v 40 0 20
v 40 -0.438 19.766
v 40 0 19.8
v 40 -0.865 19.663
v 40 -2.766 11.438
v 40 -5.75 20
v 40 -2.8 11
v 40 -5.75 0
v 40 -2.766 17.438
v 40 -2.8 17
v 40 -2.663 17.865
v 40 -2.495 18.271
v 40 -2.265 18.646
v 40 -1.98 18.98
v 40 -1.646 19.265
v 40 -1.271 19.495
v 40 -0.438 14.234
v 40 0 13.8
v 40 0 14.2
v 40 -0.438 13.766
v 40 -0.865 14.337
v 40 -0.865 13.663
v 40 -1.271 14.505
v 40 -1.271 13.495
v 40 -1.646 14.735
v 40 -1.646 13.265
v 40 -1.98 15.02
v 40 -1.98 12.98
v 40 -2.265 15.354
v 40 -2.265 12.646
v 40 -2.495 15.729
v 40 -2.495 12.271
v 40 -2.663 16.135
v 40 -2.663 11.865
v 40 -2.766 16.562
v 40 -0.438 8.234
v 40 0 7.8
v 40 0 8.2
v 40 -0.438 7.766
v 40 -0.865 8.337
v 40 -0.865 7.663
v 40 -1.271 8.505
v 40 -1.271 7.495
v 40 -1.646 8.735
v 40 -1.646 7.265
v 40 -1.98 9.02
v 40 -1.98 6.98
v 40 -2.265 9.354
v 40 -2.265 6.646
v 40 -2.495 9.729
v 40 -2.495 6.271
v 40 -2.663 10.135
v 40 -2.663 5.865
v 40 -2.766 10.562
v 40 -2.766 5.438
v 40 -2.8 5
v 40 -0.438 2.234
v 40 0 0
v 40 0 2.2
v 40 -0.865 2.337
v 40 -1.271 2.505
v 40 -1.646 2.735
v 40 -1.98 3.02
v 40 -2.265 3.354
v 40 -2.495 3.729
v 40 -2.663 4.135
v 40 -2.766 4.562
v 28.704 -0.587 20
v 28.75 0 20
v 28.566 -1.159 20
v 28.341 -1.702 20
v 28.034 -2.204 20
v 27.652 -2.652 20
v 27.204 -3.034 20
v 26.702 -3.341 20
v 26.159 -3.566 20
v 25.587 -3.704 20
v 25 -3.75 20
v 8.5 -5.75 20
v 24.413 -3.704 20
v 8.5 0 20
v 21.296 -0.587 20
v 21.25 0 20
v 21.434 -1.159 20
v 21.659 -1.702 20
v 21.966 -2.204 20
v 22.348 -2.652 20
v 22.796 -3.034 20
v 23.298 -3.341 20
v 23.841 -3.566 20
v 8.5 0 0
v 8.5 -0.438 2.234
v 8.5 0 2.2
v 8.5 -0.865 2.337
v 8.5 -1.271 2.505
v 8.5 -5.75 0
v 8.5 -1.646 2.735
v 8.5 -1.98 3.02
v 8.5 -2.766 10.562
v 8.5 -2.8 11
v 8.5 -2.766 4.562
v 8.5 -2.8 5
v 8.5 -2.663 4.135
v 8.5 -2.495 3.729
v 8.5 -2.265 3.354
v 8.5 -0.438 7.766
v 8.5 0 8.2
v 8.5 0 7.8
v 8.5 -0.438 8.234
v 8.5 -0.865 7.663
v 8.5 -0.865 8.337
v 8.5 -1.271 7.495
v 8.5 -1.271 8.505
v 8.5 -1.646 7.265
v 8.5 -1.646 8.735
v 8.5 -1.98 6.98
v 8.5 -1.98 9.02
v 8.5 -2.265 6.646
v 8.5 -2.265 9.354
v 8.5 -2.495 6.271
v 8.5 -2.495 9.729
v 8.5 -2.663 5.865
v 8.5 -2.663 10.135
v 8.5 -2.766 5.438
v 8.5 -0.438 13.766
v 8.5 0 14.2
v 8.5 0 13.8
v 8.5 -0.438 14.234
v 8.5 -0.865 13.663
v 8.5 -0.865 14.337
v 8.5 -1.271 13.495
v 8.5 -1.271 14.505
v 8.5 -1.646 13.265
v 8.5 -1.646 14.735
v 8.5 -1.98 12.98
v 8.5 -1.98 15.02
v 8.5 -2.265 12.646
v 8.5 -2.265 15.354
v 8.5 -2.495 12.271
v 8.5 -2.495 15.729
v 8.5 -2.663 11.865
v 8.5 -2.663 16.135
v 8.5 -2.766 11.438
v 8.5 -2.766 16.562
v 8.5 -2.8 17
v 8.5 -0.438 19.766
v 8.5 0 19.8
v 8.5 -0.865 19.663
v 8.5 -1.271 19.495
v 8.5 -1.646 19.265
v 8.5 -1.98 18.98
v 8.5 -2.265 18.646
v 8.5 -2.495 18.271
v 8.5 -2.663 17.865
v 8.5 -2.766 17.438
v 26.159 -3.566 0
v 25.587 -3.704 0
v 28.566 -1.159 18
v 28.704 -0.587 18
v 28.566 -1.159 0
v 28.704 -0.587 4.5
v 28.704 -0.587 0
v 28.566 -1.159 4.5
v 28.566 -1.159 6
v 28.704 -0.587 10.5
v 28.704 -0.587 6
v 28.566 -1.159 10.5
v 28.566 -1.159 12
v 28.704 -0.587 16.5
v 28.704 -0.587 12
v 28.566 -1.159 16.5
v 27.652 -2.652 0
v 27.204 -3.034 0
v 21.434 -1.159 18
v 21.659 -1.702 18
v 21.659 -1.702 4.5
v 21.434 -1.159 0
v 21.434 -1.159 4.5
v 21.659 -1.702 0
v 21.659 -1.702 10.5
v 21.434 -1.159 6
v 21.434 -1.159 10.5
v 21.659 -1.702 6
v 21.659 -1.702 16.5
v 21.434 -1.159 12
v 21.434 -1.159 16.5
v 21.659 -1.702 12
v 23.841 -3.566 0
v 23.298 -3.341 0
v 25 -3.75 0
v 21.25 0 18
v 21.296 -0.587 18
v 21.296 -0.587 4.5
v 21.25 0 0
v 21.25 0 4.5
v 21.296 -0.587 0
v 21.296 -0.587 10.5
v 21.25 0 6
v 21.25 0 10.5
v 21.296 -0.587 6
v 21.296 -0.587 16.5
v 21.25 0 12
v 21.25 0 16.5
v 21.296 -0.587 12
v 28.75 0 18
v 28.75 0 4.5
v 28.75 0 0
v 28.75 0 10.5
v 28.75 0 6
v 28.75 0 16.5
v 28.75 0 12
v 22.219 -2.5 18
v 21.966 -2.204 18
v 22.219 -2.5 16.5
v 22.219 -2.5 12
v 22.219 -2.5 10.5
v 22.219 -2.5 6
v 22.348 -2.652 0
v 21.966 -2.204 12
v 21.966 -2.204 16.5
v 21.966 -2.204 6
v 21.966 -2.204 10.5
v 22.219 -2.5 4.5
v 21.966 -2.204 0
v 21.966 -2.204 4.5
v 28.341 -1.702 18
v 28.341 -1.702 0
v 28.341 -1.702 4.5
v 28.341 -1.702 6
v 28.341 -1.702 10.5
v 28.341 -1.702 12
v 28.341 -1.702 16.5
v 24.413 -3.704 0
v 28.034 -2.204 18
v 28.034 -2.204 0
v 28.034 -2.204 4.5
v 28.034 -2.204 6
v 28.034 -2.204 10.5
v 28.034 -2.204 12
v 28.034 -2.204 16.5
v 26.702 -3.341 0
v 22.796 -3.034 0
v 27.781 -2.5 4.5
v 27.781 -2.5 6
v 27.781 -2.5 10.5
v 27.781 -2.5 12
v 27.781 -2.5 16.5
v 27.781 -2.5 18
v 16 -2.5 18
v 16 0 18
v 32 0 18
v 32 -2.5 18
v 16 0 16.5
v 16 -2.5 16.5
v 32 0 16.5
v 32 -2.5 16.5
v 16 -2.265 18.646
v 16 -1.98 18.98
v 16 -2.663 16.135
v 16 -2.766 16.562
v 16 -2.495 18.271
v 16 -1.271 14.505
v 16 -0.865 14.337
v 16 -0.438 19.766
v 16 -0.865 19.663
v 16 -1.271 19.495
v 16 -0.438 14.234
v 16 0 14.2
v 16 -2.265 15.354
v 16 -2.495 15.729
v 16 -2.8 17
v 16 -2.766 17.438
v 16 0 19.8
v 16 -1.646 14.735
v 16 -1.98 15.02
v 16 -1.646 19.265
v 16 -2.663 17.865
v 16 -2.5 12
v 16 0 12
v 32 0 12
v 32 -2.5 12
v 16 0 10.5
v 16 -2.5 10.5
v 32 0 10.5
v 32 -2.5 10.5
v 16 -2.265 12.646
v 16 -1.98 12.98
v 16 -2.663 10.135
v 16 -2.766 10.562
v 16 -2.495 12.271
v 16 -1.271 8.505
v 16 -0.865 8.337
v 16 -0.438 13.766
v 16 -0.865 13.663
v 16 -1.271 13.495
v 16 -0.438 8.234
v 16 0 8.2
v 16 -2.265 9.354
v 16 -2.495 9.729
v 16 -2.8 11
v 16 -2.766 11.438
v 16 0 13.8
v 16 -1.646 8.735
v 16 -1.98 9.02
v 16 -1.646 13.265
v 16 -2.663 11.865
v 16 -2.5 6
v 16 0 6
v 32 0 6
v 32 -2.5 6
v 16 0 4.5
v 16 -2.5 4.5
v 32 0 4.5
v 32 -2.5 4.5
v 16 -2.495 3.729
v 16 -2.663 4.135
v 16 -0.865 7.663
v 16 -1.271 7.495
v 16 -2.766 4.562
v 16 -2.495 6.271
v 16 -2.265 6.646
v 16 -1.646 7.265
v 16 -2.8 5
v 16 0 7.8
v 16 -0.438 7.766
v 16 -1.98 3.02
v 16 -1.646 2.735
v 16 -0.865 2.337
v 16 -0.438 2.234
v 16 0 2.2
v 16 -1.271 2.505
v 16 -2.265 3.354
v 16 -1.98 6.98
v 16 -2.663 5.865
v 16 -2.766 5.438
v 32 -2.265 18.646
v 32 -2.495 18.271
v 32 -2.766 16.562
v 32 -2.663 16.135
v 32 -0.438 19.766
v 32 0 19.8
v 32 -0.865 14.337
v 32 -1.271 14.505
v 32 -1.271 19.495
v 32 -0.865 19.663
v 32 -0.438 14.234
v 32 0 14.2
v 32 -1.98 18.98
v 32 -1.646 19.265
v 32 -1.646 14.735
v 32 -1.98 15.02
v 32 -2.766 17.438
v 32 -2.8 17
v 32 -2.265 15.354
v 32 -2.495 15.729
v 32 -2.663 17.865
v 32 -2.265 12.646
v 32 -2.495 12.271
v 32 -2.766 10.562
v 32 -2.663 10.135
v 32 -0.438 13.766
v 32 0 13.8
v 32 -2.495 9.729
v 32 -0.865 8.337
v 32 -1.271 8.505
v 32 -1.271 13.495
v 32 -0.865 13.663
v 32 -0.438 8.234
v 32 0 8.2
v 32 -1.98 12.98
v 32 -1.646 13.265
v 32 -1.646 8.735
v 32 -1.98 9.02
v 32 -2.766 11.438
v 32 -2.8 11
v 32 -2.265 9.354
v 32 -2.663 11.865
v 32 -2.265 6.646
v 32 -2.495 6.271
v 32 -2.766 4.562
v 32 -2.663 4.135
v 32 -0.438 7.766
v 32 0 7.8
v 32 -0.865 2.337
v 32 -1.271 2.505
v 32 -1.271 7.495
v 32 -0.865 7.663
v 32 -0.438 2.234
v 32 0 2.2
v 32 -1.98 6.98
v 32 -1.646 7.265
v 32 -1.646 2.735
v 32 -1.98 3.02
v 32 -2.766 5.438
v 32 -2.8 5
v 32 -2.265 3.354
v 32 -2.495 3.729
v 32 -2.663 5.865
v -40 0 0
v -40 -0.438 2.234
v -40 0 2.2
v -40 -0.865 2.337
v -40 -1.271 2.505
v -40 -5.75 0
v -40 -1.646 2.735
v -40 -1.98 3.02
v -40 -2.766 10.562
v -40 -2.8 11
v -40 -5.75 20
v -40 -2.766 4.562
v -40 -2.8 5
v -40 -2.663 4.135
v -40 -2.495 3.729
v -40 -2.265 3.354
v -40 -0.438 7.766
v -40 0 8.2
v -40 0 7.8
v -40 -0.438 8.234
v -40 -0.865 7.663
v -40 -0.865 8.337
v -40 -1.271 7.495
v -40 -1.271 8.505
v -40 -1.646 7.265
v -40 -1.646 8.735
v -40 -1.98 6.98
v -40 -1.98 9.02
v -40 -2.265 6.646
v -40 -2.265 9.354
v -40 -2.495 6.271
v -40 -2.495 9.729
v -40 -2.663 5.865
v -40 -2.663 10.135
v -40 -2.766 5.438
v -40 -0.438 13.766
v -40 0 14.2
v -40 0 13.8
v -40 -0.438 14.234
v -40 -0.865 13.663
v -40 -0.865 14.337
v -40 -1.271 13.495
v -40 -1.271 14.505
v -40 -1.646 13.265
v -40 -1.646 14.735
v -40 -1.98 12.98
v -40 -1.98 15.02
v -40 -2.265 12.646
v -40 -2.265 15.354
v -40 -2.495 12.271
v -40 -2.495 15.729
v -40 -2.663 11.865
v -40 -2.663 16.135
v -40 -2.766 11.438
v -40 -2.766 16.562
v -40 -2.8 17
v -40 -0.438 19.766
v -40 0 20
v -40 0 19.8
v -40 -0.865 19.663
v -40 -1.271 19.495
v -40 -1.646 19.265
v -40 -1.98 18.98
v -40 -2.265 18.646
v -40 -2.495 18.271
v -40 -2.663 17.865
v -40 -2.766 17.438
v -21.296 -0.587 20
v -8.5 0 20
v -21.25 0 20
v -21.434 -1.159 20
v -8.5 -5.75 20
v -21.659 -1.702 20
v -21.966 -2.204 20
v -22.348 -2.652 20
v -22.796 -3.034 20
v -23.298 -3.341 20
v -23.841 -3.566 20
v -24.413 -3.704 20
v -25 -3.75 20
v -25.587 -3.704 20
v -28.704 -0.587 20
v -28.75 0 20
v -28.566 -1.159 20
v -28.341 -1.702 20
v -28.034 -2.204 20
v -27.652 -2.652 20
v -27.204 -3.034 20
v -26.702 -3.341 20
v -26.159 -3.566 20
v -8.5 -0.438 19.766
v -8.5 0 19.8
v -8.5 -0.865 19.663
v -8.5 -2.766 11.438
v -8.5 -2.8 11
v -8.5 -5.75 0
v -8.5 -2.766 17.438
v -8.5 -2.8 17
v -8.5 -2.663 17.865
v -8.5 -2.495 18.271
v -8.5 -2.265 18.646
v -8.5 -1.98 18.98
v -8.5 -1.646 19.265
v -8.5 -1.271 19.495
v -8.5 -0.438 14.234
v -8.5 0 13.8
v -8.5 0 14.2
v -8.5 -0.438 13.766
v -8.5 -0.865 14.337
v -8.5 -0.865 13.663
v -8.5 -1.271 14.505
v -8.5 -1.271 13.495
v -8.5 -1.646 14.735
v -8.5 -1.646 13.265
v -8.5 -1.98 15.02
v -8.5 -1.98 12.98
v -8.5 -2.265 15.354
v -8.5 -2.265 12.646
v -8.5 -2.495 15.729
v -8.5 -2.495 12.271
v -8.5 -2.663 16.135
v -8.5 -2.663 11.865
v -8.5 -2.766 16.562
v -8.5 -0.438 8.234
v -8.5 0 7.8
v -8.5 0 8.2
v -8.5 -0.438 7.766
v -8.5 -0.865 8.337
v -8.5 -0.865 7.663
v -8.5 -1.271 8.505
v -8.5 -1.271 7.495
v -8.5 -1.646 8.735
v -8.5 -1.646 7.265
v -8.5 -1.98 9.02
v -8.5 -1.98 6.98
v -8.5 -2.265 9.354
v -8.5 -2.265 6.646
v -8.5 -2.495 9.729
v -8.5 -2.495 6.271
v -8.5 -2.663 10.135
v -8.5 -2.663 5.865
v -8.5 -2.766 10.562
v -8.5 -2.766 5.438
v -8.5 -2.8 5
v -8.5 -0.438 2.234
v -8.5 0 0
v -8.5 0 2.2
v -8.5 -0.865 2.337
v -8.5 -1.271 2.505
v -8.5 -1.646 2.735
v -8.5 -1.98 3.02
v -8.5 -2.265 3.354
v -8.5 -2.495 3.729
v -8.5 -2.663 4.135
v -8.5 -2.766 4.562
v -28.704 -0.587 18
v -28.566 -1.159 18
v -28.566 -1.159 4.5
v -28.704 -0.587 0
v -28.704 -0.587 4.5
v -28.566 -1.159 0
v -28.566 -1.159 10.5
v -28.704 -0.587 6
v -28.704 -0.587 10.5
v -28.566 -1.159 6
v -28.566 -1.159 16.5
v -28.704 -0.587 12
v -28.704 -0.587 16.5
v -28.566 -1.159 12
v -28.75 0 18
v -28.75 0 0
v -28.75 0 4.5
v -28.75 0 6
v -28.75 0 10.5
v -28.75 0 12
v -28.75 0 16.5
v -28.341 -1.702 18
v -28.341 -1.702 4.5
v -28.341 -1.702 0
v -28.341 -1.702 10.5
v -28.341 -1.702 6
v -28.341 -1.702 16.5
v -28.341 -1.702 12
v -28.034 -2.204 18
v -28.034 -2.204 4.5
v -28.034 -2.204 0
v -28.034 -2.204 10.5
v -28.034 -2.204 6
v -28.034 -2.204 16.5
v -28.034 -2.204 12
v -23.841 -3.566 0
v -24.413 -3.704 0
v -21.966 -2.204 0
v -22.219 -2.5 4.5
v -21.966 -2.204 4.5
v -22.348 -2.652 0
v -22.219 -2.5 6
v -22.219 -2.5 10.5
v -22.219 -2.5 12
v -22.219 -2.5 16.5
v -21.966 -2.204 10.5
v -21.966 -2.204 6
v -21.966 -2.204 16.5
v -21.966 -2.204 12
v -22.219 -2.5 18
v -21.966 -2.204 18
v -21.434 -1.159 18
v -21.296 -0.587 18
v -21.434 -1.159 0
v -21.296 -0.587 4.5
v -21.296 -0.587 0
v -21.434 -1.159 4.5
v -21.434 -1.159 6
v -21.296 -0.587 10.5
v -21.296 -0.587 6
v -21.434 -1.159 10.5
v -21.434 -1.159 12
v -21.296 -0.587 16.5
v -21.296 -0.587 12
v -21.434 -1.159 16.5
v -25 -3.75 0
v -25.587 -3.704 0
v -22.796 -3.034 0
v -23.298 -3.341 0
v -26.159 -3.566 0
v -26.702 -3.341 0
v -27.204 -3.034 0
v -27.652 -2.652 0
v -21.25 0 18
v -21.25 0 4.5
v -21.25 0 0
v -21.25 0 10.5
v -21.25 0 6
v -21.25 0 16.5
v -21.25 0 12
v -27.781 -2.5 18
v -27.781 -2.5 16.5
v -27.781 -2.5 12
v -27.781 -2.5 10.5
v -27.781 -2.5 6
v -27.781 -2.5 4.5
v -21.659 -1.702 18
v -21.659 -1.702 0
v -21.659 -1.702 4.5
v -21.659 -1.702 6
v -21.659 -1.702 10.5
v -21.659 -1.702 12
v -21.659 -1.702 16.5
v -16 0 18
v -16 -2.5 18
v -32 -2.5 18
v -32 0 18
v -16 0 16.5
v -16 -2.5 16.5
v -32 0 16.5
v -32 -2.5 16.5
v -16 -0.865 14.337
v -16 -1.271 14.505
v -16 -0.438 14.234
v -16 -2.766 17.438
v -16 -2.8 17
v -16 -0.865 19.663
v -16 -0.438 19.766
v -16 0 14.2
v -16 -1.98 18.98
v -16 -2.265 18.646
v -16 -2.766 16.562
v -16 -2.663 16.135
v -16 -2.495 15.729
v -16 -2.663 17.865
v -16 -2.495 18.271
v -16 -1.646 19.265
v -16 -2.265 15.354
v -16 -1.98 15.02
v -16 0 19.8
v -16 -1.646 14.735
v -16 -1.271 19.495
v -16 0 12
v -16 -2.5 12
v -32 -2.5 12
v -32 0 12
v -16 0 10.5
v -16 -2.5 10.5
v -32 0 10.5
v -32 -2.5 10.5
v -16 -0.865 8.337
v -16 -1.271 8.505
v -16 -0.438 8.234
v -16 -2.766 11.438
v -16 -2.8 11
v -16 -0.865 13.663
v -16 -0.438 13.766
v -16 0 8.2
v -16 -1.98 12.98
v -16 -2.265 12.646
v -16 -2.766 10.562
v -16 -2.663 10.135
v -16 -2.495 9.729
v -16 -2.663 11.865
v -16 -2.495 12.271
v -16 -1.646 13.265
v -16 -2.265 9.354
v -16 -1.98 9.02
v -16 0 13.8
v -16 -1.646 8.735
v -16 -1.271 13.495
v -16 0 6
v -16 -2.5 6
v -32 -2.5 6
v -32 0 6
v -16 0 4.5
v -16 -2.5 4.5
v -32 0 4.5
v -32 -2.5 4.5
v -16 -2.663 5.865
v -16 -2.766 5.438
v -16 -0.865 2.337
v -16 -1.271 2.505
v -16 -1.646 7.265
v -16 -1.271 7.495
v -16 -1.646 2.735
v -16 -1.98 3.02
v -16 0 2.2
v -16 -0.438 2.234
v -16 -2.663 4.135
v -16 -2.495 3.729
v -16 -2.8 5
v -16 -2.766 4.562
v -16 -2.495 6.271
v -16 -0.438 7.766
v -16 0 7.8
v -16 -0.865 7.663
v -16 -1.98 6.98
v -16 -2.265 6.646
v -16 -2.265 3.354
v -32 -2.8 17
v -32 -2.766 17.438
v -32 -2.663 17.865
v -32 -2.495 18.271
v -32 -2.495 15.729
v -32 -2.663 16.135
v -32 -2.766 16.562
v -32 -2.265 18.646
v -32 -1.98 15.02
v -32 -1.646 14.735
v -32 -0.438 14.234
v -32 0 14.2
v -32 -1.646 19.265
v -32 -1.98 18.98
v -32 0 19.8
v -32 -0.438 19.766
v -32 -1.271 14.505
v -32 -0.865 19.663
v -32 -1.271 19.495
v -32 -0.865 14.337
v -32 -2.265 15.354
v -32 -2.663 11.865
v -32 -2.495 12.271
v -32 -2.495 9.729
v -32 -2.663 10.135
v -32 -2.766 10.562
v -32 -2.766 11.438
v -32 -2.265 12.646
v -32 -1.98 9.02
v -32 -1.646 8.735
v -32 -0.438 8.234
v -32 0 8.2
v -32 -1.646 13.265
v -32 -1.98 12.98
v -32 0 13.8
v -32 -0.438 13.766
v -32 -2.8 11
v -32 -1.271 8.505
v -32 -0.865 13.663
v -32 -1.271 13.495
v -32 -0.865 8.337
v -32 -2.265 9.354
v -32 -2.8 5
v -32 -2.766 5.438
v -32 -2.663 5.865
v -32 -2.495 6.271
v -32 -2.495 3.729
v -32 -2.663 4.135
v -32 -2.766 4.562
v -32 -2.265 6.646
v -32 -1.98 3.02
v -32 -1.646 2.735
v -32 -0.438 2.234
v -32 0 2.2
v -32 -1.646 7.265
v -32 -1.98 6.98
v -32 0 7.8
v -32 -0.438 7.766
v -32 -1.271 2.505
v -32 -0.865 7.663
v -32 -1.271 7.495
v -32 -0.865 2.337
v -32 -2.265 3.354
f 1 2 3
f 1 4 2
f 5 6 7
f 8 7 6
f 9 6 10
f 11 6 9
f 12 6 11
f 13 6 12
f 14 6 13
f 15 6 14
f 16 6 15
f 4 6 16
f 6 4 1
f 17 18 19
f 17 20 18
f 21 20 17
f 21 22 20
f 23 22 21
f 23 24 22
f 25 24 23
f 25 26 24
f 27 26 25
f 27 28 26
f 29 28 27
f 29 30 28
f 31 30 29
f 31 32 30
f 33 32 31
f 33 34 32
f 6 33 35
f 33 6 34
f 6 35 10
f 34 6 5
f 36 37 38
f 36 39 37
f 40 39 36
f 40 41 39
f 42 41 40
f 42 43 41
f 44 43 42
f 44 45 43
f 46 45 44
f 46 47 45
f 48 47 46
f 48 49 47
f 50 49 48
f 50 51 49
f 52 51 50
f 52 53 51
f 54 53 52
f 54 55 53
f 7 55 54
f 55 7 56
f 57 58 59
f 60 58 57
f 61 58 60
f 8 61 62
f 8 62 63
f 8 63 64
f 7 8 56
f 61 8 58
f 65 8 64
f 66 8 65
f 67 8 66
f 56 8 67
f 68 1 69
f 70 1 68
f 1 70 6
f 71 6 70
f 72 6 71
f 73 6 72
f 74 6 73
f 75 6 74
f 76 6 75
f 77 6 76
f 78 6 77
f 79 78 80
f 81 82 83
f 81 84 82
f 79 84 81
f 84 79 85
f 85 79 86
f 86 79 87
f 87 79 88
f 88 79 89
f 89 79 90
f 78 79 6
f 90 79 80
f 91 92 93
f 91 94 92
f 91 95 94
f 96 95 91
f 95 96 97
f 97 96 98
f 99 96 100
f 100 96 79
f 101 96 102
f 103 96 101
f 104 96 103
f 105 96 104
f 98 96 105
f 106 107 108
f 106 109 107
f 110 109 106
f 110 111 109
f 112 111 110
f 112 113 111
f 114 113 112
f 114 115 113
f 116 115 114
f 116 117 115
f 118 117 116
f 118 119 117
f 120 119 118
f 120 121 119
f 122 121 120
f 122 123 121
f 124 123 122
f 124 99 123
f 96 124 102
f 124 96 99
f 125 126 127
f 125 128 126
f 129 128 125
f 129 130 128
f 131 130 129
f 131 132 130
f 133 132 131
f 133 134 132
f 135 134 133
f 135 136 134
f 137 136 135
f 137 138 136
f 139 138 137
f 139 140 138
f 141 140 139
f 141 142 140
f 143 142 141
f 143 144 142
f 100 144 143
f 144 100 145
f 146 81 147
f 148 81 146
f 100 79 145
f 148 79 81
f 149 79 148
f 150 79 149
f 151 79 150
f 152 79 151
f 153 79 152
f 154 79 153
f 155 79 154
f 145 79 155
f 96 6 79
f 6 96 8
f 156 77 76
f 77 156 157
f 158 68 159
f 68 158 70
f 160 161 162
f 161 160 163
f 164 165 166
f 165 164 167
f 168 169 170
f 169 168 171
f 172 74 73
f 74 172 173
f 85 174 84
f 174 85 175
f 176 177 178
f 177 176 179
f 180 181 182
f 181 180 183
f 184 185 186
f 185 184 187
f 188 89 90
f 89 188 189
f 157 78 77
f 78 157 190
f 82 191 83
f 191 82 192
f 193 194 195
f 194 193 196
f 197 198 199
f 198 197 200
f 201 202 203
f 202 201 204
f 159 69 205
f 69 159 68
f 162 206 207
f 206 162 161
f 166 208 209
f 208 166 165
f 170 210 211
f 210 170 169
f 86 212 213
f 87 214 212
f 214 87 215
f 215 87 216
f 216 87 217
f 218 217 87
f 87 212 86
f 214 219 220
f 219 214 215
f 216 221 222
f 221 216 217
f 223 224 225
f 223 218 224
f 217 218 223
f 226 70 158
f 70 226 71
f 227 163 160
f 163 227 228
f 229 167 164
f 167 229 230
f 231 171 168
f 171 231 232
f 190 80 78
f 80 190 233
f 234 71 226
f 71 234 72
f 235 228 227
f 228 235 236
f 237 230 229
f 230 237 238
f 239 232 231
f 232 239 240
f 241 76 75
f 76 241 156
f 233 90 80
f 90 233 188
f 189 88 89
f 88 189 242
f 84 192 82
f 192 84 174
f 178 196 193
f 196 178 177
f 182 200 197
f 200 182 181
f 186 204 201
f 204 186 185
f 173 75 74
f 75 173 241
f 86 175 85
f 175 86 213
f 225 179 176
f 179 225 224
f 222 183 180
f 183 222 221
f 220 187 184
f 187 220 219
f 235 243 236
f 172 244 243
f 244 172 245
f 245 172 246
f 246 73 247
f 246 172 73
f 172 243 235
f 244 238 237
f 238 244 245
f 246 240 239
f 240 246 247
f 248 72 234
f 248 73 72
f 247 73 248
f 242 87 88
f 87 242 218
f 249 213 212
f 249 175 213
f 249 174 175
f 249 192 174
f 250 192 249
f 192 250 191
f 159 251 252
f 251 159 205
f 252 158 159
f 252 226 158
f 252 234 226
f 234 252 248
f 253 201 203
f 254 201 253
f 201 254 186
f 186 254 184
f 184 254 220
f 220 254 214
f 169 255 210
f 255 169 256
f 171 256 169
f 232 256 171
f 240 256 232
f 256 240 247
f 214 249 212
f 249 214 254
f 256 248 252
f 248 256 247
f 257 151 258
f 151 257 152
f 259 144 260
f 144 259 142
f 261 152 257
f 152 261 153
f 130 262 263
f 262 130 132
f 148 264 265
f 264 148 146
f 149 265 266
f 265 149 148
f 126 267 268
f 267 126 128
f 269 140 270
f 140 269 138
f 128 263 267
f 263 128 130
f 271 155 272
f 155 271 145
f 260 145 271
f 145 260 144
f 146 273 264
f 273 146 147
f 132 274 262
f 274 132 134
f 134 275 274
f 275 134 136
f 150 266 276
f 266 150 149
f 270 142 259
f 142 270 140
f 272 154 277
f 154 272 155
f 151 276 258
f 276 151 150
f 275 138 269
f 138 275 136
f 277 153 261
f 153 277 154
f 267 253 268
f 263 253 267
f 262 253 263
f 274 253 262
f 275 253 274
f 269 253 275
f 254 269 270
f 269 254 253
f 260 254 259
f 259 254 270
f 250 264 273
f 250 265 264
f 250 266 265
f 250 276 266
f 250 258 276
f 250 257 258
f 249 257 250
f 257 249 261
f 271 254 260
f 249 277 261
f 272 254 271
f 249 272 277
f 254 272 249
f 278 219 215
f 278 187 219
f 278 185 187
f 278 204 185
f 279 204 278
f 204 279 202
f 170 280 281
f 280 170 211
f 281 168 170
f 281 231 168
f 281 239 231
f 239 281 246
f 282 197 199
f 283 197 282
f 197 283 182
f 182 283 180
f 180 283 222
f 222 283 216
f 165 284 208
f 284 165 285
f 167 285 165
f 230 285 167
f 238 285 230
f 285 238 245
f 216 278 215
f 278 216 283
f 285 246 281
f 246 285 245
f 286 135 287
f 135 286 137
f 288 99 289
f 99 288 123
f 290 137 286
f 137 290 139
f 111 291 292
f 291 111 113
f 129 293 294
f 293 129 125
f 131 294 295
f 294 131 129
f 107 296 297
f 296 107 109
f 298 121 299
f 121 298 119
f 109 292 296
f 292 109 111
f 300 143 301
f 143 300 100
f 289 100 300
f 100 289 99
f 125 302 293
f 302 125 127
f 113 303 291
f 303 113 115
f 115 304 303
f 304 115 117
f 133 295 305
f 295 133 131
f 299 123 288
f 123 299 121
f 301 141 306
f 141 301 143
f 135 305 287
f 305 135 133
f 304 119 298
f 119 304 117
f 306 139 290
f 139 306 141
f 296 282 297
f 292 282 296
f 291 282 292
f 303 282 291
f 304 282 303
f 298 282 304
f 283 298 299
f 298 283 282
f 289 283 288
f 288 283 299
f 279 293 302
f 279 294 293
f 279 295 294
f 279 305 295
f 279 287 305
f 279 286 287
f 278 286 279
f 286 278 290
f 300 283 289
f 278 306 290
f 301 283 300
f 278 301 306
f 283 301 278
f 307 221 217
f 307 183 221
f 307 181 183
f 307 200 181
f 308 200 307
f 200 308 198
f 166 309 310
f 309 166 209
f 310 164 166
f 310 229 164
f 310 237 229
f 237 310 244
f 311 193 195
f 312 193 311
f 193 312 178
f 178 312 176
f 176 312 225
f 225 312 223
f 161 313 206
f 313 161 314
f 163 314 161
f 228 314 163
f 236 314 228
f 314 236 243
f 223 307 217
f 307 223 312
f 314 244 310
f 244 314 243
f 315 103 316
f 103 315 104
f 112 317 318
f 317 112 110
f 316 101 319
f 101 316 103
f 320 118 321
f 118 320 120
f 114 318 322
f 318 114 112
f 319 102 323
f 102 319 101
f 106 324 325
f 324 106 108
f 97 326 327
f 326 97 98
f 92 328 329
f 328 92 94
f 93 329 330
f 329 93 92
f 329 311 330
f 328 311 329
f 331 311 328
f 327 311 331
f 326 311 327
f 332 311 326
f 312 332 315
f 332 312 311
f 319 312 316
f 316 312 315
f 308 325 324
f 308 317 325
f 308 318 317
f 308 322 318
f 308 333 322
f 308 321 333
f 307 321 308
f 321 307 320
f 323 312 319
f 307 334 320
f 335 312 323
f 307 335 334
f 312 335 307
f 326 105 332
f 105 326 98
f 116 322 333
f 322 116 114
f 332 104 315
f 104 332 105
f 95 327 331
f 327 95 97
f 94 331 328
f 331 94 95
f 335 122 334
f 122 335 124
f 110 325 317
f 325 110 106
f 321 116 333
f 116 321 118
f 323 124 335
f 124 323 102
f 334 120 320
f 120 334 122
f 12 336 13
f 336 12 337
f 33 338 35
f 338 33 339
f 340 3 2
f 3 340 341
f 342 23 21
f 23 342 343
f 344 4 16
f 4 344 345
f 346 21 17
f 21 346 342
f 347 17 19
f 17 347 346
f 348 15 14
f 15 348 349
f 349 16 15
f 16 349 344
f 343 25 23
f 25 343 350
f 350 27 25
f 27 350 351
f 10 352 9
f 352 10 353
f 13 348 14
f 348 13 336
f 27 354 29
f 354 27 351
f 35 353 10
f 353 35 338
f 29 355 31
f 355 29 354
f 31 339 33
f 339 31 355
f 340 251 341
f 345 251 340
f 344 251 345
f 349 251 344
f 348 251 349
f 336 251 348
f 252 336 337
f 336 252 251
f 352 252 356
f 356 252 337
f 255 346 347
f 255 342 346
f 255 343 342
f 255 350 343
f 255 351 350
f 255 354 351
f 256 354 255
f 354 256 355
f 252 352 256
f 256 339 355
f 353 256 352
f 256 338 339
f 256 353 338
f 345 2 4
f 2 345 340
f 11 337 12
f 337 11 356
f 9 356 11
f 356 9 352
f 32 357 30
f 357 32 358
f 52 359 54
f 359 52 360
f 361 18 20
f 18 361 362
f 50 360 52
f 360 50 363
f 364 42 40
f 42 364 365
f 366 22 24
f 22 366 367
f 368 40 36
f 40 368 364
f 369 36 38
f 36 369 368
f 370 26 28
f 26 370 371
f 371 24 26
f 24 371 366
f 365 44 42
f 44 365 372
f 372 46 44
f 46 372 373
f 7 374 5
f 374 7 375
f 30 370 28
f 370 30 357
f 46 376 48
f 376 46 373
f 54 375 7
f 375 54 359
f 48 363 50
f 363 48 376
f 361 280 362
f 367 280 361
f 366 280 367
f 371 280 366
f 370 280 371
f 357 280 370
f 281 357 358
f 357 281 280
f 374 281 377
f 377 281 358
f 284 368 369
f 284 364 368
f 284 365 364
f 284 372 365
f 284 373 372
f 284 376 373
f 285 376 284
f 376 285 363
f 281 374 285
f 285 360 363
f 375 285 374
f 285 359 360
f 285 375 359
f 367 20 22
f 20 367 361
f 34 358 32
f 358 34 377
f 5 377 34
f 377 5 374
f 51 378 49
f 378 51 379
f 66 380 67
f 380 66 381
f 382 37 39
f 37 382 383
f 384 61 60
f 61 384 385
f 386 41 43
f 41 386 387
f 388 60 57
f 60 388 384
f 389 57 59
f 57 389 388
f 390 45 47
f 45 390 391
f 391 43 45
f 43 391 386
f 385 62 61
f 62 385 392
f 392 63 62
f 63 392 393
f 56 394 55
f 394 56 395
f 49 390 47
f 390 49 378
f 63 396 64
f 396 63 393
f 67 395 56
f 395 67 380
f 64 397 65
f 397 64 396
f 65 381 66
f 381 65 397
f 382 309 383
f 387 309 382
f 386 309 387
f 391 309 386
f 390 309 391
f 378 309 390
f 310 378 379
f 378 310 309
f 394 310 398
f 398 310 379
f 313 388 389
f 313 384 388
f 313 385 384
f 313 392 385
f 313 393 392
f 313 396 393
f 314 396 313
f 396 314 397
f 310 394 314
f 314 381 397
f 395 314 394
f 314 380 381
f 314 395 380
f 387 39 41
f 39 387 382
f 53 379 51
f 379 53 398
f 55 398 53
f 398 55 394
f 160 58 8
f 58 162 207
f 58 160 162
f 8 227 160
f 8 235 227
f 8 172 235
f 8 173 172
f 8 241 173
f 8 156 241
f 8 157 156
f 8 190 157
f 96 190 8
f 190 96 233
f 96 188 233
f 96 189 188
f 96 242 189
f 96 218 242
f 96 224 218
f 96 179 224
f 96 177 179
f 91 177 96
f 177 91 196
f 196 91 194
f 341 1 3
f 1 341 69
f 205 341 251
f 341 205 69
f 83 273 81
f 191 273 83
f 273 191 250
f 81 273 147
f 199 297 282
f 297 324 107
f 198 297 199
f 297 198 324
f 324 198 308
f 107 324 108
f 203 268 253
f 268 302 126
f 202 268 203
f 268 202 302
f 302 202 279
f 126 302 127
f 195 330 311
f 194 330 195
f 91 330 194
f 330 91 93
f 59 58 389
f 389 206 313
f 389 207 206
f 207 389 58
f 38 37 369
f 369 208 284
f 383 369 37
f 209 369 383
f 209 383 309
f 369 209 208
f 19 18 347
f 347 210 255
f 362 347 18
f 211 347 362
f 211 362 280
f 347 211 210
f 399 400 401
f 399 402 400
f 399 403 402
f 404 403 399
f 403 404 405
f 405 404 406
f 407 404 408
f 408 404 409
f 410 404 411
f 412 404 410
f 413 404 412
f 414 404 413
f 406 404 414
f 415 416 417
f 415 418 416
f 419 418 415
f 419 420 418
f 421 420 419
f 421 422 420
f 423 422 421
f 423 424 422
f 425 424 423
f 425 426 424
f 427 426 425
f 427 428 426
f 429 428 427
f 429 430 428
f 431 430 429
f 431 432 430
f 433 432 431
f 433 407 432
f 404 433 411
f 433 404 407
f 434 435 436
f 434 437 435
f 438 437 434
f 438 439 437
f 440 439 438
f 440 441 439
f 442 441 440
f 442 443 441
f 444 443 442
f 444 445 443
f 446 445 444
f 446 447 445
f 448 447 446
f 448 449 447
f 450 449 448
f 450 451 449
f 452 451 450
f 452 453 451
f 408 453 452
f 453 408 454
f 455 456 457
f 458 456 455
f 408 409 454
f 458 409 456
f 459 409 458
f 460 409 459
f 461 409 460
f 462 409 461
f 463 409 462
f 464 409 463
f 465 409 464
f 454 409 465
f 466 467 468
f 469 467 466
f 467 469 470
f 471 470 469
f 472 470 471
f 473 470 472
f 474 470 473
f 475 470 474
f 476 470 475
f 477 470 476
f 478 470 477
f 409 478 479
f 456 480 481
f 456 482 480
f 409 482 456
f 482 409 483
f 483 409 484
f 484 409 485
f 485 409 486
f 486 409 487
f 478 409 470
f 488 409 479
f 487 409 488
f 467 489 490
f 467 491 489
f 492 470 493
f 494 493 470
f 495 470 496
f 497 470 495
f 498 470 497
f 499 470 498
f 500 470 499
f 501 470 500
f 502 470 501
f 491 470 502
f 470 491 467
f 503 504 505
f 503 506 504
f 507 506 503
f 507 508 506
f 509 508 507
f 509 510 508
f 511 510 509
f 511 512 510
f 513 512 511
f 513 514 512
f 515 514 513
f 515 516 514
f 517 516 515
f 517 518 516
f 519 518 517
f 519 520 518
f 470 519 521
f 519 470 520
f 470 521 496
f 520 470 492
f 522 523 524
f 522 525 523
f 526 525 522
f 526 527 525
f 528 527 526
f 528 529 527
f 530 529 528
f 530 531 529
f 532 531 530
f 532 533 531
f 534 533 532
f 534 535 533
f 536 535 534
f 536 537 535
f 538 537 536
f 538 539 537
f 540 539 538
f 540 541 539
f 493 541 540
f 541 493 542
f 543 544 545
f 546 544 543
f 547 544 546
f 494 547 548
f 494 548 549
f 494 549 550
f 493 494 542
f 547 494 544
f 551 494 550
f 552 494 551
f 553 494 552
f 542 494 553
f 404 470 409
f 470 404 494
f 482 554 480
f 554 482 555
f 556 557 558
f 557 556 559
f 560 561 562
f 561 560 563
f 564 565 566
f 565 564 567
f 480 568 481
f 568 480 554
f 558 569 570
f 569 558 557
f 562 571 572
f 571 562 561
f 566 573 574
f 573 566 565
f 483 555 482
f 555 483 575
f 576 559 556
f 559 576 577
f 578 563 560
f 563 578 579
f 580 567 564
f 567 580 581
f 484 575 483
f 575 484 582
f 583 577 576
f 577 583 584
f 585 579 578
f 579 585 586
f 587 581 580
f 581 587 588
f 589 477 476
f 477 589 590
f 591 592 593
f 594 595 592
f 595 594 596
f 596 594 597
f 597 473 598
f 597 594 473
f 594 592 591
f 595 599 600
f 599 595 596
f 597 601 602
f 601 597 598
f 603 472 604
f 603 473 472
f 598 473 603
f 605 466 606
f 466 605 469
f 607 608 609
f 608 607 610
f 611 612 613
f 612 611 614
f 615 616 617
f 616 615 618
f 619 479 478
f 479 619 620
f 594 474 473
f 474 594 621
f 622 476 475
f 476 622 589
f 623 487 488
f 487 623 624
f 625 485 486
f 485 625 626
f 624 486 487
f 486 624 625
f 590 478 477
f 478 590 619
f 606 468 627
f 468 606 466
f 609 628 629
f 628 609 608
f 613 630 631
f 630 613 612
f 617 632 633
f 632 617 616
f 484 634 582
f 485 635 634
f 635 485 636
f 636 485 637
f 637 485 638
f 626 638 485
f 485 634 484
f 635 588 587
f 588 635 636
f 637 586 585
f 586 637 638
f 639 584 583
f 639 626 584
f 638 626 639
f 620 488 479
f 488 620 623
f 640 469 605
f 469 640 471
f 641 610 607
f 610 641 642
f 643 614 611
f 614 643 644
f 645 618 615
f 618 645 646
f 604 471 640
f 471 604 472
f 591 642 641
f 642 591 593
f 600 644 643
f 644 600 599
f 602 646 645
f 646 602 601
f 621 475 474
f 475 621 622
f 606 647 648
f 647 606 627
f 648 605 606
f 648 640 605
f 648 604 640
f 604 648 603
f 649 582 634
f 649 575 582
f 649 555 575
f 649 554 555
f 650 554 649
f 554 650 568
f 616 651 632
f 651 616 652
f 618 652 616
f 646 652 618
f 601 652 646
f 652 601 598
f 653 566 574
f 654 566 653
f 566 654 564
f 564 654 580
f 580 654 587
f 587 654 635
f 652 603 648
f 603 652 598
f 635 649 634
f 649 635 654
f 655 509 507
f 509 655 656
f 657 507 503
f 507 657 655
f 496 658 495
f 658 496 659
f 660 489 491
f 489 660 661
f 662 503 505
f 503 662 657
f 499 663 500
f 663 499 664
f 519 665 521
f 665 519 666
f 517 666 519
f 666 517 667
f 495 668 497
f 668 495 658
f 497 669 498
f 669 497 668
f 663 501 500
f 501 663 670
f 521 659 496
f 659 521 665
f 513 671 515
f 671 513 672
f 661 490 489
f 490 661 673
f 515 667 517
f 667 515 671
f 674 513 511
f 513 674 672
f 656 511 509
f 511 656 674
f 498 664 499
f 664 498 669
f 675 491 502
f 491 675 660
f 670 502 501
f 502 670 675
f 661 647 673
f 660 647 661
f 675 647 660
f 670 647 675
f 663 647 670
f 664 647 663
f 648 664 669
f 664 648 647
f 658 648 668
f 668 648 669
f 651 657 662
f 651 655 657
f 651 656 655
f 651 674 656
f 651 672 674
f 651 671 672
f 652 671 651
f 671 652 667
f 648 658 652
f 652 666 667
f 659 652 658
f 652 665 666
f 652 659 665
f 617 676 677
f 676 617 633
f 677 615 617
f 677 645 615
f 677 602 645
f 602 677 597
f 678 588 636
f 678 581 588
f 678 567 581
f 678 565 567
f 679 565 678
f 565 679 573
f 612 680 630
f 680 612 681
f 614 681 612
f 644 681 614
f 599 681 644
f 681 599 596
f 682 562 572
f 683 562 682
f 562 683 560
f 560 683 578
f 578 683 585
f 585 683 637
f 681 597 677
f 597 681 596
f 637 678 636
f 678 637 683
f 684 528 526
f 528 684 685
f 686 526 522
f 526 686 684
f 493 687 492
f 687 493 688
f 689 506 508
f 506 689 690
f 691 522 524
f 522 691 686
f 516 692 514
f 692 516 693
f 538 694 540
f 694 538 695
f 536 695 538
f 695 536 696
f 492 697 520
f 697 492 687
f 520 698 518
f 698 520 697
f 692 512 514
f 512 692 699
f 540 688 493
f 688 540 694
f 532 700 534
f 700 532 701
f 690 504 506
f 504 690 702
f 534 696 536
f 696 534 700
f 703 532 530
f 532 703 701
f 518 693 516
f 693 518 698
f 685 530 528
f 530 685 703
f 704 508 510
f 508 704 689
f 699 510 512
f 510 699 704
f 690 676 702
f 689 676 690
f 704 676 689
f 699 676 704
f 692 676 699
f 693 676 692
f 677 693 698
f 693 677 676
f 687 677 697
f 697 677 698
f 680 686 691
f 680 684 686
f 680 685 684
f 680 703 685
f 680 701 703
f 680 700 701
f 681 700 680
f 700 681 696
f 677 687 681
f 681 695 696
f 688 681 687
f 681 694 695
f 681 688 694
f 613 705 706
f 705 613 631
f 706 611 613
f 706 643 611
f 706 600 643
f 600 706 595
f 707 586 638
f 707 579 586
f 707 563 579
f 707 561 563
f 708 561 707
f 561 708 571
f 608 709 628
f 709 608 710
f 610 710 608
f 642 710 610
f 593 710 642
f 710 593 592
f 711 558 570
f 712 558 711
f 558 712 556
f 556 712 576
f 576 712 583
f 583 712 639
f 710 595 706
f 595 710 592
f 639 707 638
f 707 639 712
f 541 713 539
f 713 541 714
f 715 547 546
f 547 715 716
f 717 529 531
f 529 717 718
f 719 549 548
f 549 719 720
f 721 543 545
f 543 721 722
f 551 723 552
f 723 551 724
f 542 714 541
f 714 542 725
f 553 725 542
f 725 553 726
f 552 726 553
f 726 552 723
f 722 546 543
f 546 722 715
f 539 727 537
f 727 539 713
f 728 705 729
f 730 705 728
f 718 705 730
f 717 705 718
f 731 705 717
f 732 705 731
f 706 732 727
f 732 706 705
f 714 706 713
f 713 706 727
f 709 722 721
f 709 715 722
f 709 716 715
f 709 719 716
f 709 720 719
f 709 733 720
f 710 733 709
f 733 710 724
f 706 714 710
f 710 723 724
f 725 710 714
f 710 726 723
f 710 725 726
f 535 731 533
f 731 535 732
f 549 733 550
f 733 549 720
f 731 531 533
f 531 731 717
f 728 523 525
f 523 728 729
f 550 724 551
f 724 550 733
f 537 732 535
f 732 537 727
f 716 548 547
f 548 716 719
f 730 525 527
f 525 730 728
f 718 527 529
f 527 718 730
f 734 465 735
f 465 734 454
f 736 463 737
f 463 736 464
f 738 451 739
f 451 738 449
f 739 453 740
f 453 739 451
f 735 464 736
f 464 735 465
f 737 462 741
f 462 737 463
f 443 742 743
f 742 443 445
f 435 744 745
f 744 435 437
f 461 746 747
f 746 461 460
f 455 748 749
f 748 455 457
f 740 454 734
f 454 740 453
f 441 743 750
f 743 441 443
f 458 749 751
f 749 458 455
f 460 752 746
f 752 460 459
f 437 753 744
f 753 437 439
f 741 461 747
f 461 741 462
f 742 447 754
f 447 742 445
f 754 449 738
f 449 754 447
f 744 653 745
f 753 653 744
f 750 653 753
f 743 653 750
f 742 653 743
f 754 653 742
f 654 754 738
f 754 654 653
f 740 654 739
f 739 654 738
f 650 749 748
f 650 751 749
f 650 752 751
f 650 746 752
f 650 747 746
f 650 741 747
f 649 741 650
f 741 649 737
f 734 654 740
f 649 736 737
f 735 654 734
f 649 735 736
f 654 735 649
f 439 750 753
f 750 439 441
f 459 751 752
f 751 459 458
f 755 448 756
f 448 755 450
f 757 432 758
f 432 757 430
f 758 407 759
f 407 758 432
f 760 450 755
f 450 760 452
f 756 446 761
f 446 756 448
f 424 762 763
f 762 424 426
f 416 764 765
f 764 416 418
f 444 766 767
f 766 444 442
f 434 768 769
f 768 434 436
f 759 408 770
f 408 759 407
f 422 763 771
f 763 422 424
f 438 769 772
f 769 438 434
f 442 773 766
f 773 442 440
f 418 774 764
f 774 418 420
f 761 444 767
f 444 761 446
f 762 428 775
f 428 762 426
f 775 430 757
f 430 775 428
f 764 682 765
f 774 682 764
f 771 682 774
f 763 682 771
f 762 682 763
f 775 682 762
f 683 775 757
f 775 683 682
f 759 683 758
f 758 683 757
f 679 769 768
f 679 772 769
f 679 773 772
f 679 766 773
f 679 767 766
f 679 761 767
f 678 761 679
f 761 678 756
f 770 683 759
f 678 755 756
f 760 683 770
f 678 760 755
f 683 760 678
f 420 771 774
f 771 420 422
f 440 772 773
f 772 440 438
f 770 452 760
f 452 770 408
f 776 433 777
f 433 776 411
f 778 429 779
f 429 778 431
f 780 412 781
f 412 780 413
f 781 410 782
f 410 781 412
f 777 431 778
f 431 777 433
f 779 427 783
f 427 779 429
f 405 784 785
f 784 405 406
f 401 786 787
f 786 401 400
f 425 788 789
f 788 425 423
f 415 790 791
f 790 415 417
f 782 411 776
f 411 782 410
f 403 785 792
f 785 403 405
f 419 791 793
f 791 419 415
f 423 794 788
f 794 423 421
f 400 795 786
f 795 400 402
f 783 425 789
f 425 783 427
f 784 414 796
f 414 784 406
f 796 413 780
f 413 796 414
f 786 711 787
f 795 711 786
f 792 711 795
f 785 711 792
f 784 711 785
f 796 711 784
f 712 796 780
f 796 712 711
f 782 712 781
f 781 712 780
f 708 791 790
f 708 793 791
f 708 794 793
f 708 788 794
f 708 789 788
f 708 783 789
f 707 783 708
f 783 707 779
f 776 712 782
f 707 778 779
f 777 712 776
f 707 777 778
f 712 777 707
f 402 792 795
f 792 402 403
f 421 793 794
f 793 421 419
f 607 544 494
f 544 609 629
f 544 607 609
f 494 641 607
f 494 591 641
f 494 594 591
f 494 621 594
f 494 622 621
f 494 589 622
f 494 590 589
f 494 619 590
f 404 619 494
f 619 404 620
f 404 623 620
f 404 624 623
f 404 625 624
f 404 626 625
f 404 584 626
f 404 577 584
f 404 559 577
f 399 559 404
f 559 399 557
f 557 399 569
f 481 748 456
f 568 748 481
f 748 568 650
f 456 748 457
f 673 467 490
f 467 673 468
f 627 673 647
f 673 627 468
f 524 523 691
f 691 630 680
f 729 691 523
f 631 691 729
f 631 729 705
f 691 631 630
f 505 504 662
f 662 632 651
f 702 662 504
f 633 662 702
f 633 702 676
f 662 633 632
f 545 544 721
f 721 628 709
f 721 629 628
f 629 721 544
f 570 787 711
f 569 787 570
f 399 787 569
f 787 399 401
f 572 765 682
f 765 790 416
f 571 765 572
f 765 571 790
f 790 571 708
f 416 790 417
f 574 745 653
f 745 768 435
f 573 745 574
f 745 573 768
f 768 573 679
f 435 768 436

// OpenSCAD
tubeDia = 7.5; 

ledDia = 5.6; 

photoResistDia = 5.5;


module tube(){
   difference(){
    
    //cylinder(h = 30, d = tubeDia + 4);  
   translate([-(tubeDia + 4) ,-(tubeDia + 4) / 2, 0])  
       cube([tubeDia + 24, tubeDia + 4, 30]);
    translate([5,0,0]) cylinder(h = 30, d = tubeDia, $fn = 40);  
   }
}


module LEDHolder(){
    {
        
        rotate([90, 0, 0])
        rotate([0, 90, 0]){
            difference(){
                cube([ledDia + 4, ledDia + 10, ledDia + 4]);
                translate([2, 2, 0])
                cube([ledDia, ledDia + 6, 20]);
            }
        }
    }
}


module slices(){
    cube([60, 5, 1.5]); 
    
}


module photoResist(){
    intersection(){
    cylinder(h = 3, d = 5.5, $fn = 30); 
    translate([-4.5/2, -5,0]) cube([4.5, 10, 4.3]); }
    
}


module fullSetup(){
difference(){
    union(){
        tube(); 
        //translate([2.5, -4.6,14.7]) LEDHolder();
        }
    
        
    translate([0,0, 1]) {translate([-20, -2.5, 25.5]) slices();
    translate([-14, 0,26]) rotate([0, 90, 0]) cylinder(d= ledDia, h = 10, $fn = 40); 
        
    translate([-20, -2.5, 25.5 - 6]) slices();
    translate([-14, 0,26-6]) rotate([0, 90, 0]) cylinder(d= ledDia, h = 10, $fn = 40); 
    
    translate([-20, -2.5, 25.5 - 12]) slices();
    translate([-14, 0,26-12]) rotate([0, 90, 0]) cylinder(d= ledDia, h = 10, $fn = 40); 
        }
    //led's
     translate([12, 0, 27]) rotate([0, 90, 0]) cylinder(d= ledDia, h = 10, $fn = 40);  
    
     translate([12, 0, 27 - 6]) rotate([0, 90, 0]) cylinder(d= ledDia, h = 10, $fn = 40); 
    
     translate([12, 0, 27 - 12]) rotate([0, 90, 0]) cylinder(d= ledDia, h = 10, $fn = 40); 
    //translate([12, -2, 17]) cube([20, 4, 10]); 
     translate([-15, -25, -30]) cube(40);  

    //translate([0, -ledDia / 2, 16.7]) rotate([90, 0, 90]) cube([ledDia, ledDia + 6, 20]);
        //cylinder(h = 30, d = tubeDia, $fn = 40); 
    }
}



translate([15, 0, 0]) difference(){
translate([5, 0, - 10]) fullSetup(); 
    
translate([-15,0,0]) cube(50); } 



translate([5, 0,0])
rotate([0,0,180]) translate([15, 0, 0])  {
    difference(){
    translate([10, 0, -10]) fullSetup(); 
        translate([-5, -50,0]) cube(50);
        } 
}


 
    
